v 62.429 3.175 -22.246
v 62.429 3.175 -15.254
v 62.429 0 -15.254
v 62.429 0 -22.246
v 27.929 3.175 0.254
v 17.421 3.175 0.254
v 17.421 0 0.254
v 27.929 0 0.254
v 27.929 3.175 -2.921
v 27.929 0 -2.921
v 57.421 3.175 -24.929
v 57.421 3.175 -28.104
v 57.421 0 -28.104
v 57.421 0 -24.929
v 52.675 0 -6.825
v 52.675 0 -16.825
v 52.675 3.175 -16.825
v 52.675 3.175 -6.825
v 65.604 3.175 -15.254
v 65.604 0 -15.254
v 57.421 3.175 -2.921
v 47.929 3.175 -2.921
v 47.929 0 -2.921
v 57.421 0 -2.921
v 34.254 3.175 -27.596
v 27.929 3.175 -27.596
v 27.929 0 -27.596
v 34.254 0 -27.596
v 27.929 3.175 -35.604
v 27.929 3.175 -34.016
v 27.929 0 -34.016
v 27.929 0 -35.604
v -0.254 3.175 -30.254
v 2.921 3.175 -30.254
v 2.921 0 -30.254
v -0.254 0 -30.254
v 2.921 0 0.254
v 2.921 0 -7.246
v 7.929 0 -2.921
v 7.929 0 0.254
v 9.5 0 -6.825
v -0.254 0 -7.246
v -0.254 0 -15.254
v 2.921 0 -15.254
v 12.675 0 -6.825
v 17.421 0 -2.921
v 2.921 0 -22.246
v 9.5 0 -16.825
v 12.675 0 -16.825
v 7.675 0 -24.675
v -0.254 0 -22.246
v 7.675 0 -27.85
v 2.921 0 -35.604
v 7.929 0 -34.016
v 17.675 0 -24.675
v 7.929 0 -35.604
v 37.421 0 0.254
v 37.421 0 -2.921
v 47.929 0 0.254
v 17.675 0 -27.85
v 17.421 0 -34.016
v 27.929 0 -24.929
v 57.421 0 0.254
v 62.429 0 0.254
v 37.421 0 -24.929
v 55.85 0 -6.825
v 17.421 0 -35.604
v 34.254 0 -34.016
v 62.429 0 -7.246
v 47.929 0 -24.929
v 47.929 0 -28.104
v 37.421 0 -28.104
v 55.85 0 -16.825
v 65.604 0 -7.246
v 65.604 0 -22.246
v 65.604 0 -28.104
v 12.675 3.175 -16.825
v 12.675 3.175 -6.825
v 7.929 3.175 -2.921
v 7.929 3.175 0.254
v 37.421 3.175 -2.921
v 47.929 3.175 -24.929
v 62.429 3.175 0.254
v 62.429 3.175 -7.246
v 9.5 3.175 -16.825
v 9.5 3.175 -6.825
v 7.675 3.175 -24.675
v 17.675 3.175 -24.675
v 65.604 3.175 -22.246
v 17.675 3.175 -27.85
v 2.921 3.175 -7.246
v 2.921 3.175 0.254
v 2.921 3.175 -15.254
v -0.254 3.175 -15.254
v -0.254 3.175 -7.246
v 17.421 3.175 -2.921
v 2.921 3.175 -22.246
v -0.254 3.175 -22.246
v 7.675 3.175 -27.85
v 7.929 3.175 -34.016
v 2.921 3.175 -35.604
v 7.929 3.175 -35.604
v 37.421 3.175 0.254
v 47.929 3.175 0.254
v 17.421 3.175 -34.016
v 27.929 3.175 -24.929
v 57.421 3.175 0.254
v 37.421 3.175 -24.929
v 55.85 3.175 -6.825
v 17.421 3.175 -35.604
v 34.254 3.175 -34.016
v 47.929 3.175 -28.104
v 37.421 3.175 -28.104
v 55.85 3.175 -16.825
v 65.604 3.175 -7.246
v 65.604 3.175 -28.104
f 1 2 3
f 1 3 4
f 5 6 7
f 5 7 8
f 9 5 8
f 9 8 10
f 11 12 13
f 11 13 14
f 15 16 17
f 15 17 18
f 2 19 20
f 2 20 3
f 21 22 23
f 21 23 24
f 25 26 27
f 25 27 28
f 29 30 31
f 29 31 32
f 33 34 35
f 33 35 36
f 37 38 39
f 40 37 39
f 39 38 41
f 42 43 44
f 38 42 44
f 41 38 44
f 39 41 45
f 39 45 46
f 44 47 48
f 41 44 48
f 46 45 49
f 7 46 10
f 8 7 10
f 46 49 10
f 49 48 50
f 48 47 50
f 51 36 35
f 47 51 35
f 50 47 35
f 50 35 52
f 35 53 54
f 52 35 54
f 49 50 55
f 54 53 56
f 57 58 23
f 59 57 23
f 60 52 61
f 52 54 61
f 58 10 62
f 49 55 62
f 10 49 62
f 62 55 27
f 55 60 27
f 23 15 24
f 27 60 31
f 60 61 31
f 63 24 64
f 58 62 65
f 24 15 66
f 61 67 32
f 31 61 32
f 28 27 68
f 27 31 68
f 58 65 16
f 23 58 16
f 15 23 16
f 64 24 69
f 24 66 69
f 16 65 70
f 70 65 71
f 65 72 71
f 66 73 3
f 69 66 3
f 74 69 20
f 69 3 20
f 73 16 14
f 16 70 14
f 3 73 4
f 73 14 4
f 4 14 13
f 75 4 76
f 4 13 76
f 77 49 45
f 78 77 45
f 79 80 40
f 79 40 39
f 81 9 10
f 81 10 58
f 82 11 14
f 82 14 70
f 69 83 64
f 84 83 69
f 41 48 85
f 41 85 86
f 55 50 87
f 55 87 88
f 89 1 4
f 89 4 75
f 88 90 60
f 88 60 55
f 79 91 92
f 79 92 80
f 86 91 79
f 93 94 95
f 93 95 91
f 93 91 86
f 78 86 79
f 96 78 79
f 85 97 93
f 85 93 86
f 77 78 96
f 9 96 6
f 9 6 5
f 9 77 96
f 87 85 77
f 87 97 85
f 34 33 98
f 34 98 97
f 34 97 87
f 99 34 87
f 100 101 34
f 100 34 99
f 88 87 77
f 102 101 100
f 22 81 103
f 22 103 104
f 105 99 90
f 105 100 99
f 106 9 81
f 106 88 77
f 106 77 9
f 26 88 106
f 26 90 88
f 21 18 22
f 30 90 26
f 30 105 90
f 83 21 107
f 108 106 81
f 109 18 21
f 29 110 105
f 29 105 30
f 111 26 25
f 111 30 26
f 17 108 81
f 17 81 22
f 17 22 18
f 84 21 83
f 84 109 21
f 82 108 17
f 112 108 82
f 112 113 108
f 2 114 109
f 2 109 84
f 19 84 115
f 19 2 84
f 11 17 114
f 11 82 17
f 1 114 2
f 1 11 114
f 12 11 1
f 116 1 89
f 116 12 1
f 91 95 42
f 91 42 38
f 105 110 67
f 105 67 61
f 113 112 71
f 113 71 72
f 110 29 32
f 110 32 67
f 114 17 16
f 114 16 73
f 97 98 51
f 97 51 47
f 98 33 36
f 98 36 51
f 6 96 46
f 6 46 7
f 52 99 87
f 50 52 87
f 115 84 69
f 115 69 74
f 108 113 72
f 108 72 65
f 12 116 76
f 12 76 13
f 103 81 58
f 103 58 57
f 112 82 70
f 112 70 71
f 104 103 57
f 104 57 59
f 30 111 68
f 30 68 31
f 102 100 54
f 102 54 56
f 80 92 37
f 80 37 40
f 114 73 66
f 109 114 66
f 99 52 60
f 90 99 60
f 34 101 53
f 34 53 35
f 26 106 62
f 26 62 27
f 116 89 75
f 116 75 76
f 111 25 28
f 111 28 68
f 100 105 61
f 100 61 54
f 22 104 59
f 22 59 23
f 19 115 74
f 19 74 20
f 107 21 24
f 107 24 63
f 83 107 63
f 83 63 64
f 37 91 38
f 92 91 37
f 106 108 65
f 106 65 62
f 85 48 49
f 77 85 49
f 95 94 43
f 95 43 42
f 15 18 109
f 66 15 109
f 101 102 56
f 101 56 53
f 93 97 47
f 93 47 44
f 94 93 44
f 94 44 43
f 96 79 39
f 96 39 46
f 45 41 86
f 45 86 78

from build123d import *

# Parameters (mm, degrees)
SKETCH1_W           = 65.35
SKETCH1_H           = 35.35
BOSS_EXTRUDE1_DEPTH = 3.175
SKETCH2_W           = 28.175
SKETCH2_H           = 7.5
CUT_EXTRUDE1_DEPTH  = 4.175
SKETCH3_W           = 10
SKETCH3_H           = 3.175
SKETCH3_W_2         = 3.175
SKETCH3_H_2         = 7.5
SKETCH3_H_3         = 5.9125
SKETCH3_H_4         = 5.35
SKETCH3_H_5         = 1.5875
CUT_EXTRUDE2_DEPTH  = 3.175
SKETCH7_W           = 3.175
SKETCH7_H           = 10
CUT_EXTRUDE3_DEPTH  = 4.175
BOSS_EXTRUDE2_DEPTH = 3.175


with BuildPart() as part:
    # Sketch1 → Boss-Extrude1 (new body)
    with BuildSketch(Plane(origin=(0, 0, 0), x_dir=(1, 0, 0), z_dir=(0, 1, 0))):
        with Locations((32.675, 17.675)):
            Rectangle(SKETCH1_W, SKETCH1_H)
    extrude(amount=BOSS_EXTRUDE1_DEPTH)

    # Sketch2 → Cut-Extrude1 (cut, through all)
    with BuildSketch(Plane.XZ):
        with Locations((51.2625, -31.6)):
            Rectangle(SKETCH2_W, SKETCH2_H)
    extrude(amount=-CUT_EXTRUDE1_DEPTH, mode=Mode.SUBTRACT)

    # Sketch3 → Cut-Extrude2 (cut)
    with BuildSketch(Plane.XZ):
        with Locations((52.675, -1.5875)):
            Rectangle(SKETCH3_W, SKETCH3_H)
        with Locations((63.7625, -3.75)):
            Rectangle(SKETCH3_W_2, SKETCH3_H_2)
        with Locations((63.7625, -18.75)):
            Rectangle(SKETCH3_W_2, SKETCH3_H_2)
        with Locations((52.675, -26.2625)):
            Rectangle(SKETCH3_W, SKETCH3_H)
        Polygon((37.175, -27.85), (37.675, -27.85), (37.675, -24.675), (27.675, -24.675), (27.675, -27.85), (34, -27.85), align=None)
        with Locations((35.5875, -30.80625)):
            Rectangle(SKETCH3_W_2, SKETCH3_H_3)
        Polygon((37.175, -35.35), (37.175, -33.7625), (34, -33.7625), (27.675, -33.7625), (27.675, -35.35), align=None)
        with Locations((12.675, -26.2625)):
            Rectangle(SKETCH3_W, SKETCH3_H)
        with Locations((1.5875, -32.675)):
            Rectangle(SKETCH3_W_2, SKETCH3_H_4)
        with Locations((1.5875, -18.75)):
            Rectangle(SKETCH3_W_2, SKETCH3_H_2)
        with Locations((1.5875, -3.75)):
            Rectangle(SKETCH3_W_2, SKETCH3_H_2)
        with Locations((12.675, -1.5875)):
            Rectangle(SKETCH3_W, SKETCH3_H)
        with Locations((32.675, -1.5875)):
            Rectangle(SKETCH3_W, SKETCH3_H)
        with Locations((12.675, -34.55625)):
            Rectangle(SKETCH3_W, SKETCH3_H_5)
    extrude(amount=-CUT_EXTRUDE2_DEPTH, mode=Mode.SUBTRACT)

    # Sketch7 → Cut-Extrude3 (cut, through all)
    with BuildSketch(Plane.XZ):
        with Locations((11.0875, -11.825)):
            Rectangle(SKETCH7_W, SKETCH7_H)
        with Locations((54.2625, -11.825)):
            Rectangle(SKETCH7_W, SKETCH7_H)
    extrude(amount=-CUT_EXTRUDE3_DEPTH, mode=Mode.SUBTRACT)

    # Sketch6 → Boss-Extrude2 (add)
    with BuildSketch(Plane(origin=(0, 3.175, 0), x_dir=(1, 0, 0), z_dir=(0, 1, 0))):
        Polygon((7.929, -0.254), (7.929, 2.921), (17.421, 2.921), (17.421, -0.254), (27.929, -0.254), (27.929, 2.921), (37.421, 2.921), (37.421, -0.254), (47.929, -0.254), (47.929, 2.921), (57.421, 2.921), (57.421, -0.254), (62.429, -0.254), (62.429, 7.246), (65.604, 7.246), (65.604, 15.254), (62.429, 15.254), (62.429, 22.246), (65.604, 22.246), (65.604, 28.104), (57.421, 28.104), (57.421, 24.929), (47.929, 24.929), (47.929, 28.104), (37.421, 28.104), (37.421, 24.929), (27.929, 24.929), (27.929, 27.596), (34.254, 27.596), (34.254, 34.0165), (27.929, 34.0165), (27.929, 35.604), (17.421, 35.604), (17.421, 34.0165), (7.929, 34.0165), (7.929, 35.604), (2.921, 35.604), (2.921, 30.254), (-0.254, 30.254), (-0.254, 22.246), (2.921, 22.246), (2.921, 15.254), (-0.254, 15.254), (-0.254, 7.246), (2.921, 7.246), (2.921, -0.254), align=None)
        Polygon((6.675, 4.175), (18.675, 4.175), (18.675, 1), (26.675, 1), (26.675, 4.175), (38.675, 4.175), (38.675, 1), (46.675, 1), (46.675, 4.175), (58.675, 4.175), (58.675, 1), (61.175, 1), (61.175, 8.5), (64.35, 8.5), (64.35, 14), (61.175, 14), (61.175, 23.5), (64.35, 23.5), (64.35, 26.85), (58.675, 26.85), (58.675, 23.675), (46.675, 23.675), (46.675, 26.85), (38.675, 26.85), (38.675, 23.675), (26.675, 23.675), (26.675, 28.85), (33, 28.85), (33, 32.7625), (26.675, 32.7625), (26.675, 34.35), (18.675, 34.35), (18.675, 32.7625), (6.675, 32.7625), (6.675, 34.35), (4.175, 34.35), (4.175, 29), (1, 29), (1, 23.5), (4.175, 23.5), (4.175, 14), (1, 14), (1, 8.5), (4.175, 8.5), (4.175, 1), (6.675, 1), align=None, mode=Mode.SUBTRACT)
    extrude(amount=-BOSS_EXTRUDE2_DEPTH)


solid = part.part
